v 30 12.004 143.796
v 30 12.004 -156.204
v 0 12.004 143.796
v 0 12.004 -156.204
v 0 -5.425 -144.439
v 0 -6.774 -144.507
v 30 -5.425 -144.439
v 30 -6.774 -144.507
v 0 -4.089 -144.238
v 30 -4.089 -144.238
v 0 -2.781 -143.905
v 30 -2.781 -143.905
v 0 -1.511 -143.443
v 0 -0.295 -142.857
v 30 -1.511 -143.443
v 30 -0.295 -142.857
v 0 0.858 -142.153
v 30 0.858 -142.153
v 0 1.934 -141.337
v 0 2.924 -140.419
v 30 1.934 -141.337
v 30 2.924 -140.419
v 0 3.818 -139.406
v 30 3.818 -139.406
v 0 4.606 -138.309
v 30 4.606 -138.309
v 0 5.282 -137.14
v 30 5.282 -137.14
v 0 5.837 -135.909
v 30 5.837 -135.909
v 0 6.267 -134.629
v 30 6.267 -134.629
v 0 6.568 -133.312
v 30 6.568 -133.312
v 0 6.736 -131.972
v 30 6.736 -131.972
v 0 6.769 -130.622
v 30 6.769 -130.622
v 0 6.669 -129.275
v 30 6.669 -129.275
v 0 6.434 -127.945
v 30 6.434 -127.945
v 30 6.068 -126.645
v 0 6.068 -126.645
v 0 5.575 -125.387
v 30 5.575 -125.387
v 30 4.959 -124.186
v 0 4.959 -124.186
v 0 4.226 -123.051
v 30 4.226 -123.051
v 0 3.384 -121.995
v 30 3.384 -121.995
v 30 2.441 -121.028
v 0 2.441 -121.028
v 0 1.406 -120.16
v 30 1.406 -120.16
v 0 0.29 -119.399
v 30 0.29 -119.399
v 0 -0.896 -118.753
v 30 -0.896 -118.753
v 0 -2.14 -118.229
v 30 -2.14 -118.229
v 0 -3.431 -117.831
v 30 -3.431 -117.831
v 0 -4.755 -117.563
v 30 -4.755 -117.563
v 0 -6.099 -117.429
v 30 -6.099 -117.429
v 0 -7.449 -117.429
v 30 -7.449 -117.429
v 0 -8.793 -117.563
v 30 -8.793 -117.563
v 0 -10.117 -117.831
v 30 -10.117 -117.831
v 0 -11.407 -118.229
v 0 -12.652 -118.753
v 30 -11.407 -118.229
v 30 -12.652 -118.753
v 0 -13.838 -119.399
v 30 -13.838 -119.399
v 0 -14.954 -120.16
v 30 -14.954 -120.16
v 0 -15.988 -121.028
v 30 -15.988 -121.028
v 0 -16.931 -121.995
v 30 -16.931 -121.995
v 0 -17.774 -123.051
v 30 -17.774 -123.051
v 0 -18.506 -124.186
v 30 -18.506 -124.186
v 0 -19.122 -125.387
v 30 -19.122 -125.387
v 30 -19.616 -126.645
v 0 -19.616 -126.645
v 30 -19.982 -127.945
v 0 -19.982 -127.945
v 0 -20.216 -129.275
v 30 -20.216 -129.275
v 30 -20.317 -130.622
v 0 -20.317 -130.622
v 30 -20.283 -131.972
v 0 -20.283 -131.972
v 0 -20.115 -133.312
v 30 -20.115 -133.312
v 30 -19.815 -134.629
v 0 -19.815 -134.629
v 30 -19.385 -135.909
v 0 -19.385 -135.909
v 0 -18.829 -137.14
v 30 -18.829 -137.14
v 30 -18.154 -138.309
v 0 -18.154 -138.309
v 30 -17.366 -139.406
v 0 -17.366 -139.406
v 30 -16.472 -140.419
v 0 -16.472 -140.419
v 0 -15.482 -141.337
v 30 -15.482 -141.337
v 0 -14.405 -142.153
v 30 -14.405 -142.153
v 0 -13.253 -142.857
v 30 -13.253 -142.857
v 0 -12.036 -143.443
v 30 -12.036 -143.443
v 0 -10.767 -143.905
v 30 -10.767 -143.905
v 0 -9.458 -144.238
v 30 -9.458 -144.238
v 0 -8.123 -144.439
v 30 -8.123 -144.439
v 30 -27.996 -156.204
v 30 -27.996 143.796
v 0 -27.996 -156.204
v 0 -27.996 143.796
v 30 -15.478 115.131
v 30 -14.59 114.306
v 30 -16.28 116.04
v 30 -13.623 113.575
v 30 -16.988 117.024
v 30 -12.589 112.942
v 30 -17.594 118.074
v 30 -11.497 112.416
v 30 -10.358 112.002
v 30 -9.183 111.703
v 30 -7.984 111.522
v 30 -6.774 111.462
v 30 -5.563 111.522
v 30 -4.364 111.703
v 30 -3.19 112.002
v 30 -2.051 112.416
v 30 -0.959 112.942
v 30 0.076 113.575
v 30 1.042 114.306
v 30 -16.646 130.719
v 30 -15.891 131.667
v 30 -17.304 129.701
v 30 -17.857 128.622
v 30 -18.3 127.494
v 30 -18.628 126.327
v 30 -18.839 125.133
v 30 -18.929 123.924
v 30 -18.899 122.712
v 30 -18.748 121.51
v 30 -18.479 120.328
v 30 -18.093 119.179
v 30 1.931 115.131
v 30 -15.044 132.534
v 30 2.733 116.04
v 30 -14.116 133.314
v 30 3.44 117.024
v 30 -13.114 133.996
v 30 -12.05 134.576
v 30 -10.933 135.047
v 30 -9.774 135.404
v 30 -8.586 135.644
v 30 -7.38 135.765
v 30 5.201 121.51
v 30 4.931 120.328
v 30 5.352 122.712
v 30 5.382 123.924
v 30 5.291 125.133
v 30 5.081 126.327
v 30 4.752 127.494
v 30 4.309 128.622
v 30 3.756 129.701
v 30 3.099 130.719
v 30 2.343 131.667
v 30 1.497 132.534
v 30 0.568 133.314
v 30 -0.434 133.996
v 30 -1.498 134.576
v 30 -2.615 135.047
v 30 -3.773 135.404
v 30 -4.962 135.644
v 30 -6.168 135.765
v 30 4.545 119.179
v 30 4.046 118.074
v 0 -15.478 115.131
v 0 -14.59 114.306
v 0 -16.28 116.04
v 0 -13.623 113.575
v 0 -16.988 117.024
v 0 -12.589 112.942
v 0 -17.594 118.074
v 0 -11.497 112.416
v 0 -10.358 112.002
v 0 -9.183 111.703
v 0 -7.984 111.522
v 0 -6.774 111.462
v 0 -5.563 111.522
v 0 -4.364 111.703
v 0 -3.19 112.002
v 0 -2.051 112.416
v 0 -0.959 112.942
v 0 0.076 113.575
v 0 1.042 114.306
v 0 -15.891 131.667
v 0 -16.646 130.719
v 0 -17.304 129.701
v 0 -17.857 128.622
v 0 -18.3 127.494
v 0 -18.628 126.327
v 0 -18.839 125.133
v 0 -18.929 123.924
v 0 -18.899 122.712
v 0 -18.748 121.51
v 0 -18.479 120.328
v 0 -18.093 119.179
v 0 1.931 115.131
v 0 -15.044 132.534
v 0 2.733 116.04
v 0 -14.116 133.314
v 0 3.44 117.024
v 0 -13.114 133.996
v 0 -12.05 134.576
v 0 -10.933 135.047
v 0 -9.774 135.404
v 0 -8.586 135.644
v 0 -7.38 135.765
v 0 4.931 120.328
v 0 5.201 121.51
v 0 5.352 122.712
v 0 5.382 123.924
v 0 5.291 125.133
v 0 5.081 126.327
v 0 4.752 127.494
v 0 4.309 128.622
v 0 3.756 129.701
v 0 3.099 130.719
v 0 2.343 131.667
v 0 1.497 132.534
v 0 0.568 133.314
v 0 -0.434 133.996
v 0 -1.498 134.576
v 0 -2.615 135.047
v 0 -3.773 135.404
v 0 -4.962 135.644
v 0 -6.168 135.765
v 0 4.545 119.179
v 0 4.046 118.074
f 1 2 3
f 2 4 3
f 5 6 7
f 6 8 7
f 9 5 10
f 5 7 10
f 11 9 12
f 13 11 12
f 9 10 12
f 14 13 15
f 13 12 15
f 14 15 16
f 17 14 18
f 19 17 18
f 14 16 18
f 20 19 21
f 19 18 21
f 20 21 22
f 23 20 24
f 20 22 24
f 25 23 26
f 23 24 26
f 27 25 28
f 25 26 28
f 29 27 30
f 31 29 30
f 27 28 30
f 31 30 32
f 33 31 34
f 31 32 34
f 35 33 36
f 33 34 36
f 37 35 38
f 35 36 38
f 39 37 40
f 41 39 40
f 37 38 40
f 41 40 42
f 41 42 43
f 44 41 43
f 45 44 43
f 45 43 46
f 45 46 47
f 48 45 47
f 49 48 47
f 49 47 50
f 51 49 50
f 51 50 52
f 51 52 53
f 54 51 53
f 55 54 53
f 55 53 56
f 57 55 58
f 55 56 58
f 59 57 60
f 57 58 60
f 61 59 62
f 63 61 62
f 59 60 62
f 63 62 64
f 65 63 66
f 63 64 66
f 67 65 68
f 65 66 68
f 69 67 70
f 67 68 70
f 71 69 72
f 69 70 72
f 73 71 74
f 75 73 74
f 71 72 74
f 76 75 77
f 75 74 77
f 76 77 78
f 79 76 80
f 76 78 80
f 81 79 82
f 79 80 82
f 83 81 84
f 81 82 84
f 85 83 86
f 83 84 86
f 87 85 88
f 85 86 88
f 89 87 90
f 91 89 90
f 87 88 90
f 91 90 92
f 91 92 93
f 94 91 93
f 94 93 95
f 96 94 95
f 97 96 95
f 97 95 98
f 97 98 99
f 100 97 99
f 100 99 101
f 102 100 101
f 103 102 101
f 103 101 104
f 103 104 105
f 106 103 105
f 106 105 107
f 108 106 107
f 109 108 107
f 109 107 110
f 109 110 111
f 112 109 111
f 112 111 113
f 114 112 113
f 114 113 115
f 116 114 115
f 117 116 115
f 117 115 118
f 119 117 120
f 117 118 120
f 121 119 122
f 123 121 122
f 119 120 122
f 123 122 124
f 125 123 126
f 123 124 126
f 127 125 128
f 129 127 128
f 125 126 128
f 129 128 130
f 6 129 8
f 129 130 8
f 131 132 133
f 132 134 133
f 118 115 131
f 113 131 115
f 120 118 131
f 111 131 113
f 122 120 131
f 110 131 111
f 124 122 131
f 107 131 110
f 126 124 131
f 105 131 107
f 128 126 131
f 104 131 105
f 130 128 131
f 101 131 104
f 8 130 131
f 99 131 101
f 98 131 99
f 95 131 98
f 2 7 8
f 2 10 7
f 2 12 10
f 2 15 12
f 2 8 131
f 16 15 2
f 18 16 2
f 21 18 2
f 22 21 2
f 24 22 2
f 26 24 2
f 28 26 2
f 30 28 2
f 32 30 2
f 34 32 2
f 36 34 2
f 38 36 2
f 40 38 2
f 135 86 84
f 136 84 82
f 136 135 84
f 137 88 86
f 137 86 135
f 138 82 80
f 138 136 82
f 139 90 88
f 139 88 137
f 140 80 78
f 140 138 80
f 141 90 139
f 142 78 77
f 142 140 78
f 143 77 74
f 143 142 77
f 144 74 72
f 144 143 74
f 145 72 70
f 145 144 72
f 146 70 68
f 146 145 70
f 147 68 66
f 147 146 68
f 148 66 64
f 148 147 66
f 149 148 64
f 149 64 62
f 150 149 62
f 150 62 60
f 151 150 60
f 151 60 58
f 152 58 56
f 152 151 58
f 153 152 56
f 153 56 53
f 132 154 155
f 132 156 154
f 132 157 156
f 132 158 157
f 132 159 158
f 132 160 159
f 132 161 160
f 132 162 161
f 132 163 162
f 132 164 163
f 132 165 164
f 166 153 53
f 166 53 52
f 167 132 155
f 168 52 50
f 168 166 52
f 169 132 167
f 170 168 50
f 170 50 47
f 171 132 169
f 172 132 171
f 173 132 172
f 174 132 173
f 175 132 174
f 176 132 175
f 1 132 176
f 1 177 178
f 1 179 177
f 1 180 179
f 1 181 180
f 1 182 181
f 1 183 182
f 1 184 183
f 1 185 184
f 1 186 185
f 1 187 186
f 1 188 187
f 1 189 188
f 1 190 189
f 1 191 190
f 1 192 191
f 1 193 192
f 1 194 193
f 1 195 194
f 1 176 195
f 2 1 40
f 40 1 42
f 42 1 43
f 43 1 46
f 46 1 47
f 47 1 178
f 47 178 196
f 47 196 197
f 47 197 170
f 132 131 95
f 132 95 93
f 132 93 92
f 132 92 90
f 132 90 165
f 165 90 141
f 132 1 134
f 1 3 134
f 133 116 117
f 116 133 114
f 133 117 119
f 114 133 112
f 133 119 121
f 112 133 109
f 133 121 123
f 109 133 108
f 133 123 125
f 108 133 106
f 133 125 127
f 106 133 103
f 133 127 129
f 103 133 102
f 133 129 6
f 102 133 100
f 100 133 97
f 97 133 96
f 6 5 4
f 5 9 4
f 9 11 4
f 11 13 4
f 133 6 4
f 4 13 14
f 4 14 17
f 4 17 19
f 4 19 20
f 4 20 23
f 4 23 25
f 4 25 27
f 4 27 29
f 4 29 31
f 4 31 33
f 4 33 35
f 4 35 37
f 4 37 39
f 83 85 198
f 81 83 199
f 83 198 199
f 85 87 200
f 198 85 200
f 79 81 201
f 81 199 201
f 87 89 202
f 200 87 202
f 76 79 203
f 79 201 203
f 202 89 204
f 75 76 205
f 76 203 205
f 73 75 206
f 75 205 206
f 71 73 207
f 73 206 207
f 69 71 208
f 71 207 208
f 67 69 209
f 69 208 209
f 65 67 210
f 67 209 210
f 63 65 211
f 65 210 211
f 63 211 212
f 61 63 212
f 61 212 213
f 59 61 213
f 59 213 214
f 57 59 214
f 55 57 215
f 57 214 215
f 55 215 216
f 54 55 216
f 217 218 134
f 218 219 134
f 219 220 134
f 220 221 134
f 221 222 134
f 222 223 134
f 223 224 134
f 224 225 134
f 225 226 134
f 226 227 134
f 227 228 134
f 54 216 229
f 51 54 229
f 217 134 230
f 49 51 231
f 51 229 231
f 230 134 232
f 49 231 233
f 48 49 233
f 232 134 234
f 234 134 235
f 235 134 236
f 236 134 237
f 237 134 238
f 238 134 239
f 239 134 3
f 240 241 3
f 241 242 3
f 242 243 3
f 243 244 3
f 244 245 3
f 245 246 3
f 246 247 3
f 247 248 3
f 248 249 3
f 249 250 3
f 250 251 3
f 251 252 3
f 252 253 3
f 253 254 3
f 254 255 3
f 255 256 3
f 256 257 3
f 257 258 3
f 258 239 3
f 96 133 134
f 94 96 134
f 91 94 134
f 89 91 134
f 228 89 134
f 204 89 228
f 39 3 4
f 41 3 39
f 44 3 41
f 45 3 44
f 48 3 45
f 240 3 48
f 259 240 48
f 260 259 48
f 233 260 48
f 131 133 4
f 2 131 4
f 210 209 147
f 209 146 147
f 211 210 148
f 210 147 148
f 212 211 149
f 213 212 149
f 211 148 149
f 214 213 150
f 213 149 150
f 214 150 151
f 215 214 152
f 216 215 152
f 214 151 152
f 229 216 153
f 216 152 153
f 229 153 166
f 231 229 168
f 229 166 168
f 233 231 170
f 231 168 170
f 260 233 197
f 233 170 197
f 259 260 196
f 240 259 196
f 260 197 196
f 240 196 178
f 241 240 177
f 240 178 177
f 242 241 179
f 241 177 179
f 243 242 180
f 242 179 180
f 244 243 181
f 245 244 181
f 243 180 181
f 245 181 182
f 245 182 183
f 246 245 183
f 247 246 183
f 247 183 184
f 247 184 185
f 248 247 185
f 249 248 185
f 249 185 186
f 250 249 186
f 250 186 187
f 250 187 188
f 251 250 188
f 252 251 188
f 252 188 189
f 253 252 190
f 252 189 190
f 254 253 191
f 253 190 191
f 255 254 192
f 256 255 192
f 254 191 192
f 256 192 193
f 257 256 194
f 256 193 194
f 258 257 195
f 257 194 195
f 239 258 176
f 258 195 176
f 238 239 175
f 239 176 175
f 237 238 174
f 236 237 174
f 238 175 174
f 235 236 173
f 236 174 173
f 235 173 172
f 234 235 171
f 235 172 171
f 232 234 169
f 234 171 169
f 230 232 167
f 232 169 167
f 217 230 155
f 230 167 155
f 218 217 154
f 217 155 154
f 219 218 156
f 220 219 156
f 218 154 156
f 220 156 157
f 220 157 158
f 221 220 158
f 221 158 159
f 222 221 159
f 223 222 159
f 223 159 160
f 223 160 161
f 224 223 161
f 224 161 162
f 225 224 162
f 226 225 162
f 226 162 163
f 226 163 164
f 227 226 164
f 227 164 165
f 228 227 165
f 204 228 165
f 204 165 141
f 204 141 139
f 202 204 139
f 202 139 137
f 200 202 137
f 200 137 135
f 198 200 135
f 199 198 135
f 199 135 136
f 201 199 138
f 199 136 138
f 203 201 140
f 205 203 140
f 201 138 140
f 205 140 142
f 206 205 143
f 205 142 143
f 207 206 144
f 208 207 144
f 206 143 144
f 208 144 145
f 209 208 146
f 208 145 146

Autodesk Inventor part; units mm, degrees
ref_plane "YZ Plane" through (0, 0, 0) normal (1, 0, 0) x (0, 1, 0)
ref_plane "XZ Plane" through (0, 0, 0) normal (0, 1, 0) x (-1, 0, 0)
ref_plane "XY Plane" through (0, 0, 0) normal (0, 0, 1) x (1, 0, 0)
sketch "Sketch1" plane through (0, 0, 0) normal (1, 0, 0) x (0, 1, 0)
  line L0 (12.0042, 143.7964) -> (-27.9958, 143.7964)
  line L1 (-27.9958, 143.7964) -> (-27.9958, -156.2036)
  line L2 (-27.9958, -156.2036) -> (12.0042, -156.2036)
  line L3 (12.0042, -156.2036) -> (12.0042, 143.7964)
  point P0 (0, 0)
  dimension "d0" = 300
  dimension "d1" = 40
extrude "Extrusion1" add sketch "Sketch1" along normal blind 30
sketch "Sketch2" plane through (30, 0, 0) normal (1, 0, 0) x (0, 0, -1)
  circle A0 centre (-123.621, -6.7738) radius 12.1593
  circle A1 centre (130.9593, -6.7738) radius 13.5475
  point P0 (0, 0)
extrude "Extrusion2" cut sketch "Sketch2" against normal blind 30
properties part number "ejemplo_tibia"
